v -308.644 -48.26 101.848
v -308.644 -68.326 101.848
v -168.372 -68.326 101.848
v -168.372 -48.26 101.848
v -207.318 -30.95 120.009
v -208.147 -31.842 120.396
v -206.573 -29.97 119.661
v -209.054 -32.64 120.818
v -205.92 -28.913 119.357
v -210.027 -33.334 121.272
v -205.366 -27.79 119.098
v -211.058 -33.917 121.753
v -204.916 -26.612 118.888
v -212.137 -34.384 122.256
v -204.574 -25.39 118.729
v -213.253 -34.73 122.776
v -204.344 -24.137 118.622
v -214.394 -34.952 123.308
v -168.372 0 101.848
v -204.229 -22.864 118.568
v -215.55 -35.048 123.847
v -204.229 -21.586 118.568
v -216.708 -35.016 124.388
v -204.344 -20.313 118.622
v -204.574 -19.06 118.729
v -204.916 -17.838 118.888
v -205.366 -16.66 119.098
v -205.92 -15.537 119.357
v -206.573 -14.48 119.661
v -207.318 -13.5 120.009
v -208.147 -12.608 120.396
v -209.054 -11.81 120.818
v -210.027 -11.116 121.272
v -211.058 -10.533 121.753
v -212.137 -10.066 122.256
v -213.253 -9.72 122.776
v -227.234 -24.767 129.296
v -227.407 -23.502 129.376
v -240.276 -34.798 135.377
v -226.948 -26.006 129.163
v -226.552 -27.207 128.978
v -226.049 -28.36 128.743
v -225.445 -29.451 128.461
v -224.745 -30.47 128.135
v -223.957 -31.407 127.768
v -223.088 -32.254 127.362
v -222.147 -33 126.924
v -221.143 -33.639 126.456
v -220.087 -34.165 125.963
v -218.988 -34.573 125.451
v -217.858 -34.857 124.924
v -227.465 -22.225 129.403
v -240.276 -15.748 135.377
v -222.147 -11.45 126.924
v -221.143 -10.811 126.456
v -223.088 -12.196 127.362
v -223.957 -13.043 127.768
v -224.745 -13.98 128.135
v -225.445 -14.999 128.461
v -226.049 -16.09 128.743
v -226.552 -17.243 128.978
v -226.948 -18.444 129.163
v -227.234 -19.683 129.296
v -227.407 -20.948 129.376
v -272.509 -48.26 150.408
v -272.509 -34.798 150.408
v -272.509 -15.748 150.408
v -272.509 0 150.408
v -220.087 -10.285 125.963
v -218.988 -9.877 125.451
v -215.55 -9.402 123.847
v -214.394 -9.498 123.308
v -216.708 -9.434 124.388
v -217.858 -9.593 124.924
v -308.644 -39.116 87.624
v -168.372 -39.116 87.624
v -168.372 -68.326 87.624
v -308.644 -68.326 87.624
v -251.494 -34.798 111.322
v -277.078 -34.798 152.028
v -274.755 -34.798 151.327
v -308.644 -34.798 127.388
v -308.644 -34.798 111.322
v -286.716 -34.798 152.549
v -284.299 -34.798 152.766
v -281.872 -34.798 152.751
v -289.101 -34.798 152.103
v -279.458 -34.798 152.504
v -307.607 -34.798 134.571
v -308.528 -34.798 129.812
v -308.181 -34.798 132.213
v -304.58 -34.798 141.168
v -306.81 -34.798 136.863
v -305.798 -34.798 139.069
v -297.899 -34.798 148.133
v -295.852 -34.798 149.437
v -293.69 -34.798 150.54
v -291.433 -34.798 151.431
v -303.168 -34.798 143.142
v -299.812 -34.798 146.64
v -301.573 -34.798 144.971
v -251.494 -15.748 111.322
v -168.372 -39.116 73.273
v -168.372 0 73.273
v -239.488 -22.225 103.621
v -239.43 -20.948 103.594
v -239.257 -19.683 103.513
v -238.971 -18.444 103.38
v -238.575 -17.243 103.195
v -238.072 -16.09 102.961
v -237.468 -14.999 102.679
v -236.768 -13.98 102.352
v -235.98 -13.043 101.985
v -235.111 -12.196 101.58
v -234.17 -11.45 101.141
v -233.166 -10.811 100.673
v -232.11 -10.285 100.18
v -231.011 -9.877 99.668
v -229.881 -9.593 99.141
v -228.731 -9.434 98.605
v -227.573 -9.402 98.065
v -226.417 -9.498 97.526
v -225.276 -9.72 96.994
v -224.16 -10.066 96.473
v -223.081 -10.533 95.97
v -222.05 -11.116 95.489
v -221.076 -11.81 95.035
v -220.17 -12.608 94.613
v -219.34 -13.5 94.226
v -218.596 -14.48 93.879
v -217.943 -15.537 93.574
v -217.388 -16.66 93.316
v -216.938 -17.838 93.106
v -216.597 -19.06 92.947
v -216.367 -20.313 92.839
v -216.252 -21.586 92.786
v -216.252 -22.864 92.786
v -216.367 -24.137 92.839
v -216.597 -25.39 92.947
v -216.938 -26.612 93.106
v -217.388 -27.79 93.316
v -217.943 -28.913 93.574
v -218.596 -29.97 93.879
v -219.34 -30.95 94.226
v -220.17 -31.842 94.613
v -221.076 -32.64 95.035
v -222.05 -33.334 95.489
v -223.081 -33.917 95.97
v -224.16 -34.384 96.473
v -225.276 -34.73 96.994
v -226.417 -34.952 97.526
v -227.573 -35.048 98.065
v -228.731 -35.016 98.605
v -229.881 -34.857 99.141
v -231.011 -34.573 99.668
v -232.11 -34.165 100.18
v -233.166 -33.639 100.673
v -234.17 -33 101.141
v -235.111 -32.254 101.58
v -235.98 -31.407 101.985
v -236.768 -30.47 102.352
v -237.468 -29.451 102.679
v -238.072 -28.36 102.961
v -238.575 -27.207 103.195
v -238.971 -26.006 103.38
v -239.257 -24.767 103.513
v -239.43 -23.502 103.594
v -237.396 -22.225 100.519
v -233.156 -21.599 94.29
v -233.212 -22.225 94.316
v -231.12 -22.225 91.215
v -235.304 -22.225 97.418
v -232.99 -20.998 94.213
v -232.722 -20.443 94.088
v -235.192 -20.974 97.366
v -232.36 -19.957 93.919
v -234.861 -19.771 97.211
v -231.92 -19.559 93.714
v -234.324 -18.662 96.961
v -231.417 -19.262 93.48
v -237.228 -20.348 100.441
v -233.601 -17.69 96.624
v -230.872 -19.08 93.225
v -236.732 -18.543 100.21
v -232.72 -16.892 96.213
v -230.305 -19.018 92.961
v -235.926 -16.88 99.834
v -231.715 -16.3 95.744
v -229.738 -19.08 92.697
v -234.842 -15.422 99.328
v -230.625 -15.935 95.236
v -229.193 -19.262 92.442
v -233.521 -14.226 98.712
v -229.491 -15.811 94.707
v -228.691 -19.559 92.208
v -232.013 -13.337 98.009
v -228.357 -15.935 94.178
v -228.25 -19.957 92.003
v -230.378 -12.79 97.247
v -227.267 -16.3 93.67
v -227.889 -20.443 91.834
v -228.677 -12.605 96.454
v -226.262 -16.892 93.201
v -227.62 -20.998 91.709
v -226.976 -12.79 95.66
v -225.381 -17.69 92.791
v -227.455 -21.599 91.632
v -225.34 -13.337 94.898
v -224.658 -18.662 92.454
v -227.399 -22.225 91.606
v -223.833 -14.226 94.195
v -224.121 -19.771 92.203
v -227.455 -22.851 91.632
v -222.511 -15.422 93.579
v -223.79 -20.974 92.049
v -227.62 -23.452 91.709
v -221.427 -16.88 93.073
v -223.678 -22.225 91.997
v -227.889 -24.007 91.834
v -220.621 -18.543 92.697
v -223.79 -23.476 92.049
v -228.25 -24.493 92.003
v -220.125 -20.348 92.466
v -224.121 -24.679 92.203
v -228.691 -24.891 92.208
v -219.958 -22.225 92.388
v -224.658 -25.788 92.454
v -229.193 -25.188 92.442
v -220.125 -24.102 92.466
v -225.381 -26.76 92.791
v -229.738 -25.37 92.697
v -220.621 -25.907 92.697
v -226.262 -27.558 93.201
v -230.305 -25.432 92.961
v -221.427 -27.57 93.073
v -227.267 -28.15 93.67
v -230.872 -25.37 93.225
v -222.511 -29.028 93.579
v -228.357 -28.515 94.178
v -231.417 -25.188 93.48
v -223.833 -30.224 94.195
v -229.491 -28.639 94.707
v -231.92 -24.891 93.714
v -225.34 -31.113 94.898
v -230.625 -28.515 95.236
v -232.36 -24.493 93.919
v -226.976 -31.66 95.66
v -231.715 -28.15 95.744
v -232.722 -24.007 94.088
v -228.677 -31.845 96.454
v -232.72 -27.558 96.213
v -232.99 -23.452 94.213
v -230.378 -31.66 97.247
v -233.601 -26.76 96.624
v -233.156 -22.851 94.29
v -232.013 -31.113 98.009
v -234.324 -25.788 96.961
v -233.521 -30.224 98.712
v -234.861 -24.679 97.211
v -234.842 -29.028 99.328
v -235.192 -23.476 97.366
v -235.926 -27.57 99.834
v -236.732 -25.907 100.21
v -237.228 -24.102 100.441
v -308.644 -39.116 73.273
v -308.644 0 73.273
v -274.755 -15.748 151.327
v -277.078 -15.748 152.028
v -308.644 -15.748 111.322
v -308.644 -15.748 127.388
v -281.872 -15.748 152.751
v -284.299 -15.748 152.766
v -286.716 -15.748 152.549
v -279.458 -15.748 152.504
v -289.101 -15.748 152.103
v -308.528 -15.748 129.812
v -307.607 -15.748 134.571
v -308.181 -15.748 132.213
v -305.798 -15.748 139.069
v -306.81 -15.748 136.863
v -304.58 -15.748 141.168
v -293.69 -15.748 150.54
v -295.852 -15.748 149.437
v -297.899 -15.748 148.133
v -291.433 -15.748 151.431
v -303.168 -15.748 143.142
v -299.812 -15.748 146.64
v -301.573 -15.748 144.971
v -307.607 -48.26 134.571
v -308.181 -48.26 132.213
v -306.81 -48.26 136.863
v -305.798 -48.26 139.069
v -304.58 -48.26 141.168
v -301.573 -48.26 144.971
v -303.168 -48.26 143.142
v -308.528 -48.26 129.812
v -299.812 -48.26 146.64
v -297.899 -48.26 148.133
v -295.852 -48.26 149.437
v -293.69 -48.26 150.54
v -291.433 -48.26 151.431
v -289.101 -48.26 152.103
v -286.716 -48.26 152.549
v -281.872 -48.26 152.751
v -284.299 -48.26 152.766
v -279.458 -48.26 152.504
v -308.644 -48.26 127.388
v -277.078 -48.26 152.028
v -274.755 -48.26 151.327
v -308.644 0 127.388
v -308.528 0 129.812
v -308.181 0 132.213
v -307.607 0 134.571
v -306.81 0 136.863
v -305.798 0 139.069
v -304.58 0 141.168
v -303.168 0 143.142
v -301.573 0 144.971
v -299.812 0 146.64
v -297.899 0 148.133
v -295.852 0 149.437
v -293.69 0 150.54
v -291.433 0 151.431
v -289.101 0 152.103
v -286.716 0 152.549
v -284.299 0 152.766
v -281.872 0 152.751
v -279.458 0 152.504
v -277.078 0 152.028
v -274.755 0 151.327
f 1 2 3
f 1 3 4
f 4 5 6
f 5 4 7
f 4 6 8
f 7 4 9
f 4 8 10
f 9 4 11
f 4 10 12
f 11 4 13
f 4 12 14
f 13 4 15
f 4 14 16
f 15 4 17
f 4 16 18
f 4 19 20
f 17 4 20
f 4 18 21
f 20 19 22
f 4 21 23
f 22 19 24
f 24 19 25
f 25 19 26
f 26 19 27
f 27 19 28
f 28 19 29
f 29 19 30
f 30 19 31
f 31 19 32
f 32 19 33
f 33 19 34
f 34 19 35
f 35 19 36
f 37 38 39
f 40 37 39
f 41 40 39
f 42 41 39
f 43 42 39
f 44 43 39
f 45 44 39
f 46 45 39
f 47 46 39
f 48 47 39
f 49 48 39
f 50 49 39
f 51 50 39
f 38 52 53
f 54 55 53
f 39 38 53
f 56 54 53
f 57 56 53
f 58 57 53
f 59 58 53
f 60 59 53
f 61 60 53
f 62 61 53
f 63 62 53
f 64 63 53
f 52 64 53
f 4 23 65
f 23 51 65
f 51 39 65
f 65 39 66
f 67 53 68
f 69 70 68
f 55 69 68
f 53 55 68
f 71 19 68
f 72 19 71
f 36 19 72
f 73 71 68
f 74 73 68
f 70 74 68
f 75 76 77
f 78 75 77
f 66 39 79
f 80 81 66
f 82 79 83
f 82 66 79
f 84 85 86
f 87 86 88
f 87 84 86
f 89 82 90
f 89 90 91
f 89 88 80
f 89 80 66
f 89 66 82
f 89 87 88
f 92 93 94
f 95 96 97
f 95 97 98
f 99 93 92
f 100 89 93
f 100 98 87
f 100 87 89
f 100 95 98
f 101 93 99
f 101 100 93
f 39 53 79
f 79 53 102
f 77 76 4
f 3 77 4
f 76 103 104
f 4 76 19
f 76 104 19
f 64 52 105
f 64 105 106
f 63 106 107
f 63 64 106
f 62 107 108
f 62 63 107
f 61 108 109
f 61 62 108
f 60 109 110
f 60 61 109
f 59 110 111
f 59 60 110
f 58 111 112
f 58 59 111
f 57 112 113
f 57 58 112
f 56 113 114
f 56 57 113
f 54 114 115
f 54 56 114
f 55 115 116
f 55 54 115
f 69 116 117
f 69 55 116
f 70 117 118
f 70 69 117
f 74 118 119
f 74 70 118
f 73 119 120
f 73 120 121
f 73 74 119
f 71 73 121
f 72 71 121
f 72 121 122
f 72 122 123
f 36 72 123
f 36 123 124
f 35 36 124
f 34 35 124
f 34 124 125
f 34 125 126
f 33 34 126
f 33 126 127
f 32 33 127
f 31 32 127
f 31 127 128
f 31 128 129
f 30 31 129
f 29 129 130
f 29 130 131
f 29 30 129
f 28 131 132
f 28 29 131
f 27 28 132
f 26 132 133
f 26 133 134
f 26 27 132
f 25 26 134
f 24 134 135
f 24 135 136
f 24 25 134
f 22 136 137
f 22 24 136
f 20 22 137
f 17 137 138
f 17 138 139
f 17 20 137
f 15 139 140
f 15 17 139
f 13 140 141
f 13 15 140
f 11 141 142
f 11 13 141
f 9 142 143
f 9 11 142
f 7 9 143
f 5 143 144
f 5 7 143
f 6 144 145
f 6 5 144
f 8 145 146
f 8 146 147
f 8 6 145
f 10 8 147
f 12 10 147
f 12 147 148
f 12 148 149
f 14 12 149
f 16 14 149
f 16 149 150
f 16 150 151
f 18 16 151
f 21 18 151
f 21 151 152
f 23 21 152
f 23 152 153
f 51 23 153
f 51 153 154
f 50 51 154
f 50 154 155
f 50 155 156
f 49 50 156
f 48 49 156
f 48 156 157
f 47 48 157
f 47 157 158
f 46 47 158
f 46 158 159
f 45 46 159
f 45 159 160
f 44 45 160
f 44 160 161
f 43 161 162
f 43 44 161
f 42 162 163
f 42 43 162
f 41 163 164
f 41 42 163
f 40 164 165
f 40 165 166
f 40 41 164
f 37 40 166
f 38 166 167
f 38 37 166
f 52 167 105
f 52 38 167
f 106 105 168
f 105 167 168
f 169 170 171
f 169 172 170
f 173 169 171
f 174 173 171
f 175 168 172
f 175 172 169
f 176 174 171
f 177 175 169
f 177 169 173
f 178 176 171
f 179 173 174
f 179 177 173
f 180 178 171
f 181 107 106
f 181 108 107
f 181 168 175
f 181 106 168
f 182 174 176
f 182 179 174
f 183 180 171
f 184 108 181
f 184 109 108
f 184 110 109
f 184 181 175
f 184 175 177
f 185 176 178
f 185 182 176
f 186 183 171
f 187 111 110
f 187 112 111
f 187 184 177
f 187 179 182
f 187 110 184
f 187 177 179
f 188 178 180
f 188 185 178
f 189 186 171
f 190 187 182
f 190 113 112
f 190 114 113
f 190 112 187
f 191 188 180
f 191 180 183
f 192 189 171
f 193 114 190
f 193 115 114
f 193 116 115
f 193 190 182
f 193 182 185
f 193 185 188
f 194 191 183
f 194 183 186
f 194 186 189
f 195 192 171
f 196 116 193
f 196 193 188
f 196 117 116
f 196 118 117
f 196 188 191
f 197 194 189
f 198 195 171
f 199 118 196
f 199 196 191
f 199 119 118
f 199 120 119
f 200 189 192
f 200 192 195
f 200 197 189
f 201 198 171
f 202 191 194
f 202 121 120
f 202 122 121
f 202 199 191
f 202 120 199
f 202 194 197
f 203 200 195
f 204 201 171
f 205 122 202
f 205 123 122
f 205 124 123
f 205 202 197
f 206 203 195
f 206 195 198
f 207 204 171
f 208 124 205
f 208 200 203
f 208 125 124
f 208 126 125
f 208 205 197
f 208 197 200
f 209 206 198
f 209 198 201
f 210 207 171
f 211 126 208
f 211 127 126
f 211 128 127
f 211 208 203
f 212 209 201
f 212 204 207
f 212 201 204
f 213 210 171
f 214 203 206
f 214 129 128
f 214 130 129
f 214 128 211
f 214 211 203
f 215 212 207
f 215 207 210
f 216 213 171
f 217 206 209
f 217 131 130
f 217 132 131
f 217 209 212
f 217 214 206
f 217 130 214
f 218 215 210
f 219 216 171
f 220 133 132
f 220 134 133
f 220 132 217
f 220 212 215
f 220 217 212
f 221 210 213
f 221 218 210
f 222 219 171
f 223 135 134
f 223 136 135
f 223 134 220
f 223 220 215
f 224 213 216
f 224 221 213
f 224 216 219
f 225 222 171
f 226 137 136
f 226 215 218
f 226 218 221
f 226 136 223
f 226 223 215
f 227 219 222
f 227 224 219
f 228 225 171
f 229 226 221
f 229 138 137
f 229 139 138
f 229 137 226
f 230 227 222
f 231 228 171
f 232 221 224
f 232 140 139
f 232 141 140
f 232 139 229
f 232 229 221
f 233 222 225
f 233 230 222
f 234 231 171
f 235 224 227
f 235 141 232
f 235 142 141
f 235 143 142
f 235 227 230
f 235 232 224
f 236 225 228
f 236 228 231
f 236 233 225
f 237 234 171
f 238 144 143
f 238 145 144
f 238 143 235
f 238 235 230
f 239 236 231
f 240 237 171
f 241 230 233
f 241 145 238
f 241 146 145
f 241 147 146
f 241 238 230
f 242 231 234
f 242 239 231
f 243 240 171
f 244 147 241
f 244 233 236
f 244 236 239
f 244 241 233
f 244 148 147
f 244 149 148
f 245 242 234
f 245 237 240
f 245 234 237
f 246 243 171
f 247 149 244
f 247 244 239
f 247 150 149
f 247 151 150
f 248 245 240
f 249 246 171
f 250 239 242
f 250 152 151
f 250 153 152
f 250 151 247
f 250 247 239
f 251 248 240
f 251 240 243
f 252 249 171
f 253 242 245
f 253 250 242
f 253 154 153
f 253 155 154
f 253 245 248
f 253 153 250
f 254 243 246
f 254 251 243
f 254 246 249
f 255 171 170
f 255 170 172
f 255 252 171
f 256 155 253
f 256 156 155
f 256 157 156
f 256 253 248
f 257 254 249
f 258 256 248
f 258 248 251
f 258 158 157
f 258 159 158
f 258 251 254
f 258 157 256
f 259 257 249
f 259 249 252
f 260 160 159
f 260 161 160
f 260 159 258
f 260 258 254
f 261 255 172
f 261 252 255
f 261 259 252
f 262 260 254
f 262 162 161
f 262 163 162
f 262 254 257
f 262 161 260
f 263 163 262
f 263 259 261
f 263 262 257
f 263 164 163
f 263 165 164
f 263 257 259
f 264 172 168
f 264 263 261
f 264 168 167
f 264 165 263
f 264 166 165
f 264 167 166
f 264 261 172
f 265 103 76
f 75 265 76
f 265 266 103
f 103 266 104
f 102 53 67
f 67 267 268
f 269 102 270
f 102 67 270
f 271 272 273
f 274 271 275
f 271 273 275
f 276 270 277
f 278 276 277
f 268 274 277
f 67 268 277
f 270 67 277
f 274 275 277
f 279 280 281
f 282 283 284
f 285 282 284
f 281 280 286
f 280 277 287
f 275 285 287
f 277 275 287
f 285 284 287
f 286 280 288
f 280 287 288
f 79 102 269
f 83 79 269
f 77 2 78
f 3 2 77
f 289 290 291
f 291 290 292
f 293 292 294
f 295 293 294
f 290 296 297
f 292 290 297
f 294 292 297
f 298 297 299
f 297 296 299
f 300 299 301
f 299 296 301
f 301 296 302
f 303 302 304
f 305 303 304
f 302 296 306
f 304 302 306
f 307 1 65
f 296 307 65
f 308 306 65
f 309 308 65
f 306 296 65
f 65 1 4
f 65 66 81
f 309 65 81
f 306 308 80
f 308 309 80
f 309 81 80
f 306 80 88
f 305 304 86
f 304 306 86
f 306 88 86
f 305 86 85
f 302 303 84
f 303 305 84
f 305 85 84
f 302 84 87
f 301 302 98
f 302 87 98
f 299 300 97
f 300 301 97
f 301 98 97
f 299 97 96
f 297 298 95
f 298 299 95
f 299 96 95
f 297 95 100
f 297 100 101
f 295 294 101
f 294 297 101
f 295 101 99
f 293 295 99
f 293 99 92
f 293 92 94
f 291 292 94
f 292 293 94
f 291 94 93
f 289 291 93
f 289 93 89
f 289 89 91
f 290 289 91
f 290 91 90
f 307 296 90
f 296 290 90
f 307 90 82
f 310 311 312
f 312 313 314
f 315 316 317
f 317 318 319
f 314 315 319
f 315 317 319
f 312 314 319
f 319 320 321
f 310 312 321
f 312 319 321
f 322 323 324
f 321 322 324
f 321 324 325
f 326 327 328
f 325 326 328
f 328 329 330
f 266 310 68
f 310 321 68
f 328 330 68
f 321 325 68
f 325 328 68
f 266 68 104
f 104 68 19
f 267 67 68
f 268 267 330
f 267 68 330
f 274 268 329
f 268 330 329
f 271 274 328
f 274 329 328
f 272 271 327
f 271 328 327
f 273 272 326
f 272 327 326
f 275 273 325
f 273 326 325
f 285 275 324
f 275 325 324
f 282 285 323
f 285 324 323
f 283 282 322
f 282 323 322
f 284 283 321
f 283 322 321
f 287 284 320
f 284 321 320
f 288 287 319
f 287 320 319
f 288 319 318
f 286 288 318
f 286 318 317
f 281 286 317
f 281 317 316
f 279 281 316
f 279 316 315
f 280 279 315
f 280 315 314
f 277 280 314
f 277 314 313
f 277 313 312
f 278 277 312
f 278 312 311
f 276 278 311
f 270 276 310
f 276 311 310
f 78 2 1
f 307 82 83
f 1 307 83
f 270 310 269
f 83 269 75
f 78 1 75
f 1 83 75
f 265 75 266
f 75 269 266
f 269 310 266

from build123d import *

# Parameters (mm, degrees)
F1_DEPTH = 68.326
F3_DEPTH = 140.2725
F9_DEPTH = 19.05


with BuildPart() as f1:
    # F0 (on Front) → F1 (new body)
    with BuildSketch(Plane.XZ):
        with BuildLine():
            Line((-308.6435369492, 127.387571028), (-308.6435369492, 73.2729100159))
            Line((-308.6435369492, 73.2729100159), (-168.3720369492, 73.2729100159))
            Line((-168.3720369492, 73.2729100159), (-168.3720369492, 101.8479100159))
            Line((-168.3720369492, 101.8479100159), (-272.5090331009, 150.4077888187))
            ThreePointArc((-272.5090331009, 150.4077888187), (-296.8909470012, 148.8097137516), (-308.6435369492, 127.387571028))
        make_face()
    extrude(amount=F1_DEPTH)

    # F2 (on face) → F3 (cut, through all)
    with BuildSketch(Plane.YZ.offset(-168.3720369492)):
        Polygon((-39.116, 87.6239100159), (-76.0061219335, 87.6239100159), (-76.0061219335, 101.8479100159), (-48.26, 101.8479100159), (-48.26, 161.3023877144), (-91.7473509908, 161.3023877144), (-91.7473509908, 73.2729100159), (-39.116, 73.2729100159), align=None)
    extrude(amount=-F3_DEPTH, mode=Mode.SUBTRACT)

    # F5 (on offset) → F6 (revolve, cut)
    with BuildSketch(Plane(origin=(0, -22.225, 0), x_dir=(-1, 0, 0), z_dir=(0, 1, 0))):
        Polygon((226.816497322, 130.7939626652), (214.7088005788, 126.4077344154), (231.1195903604, 91.2146821577), (239.487580328, 103.6207374686), align=None)
    revolve(axis=Axis((-222.9141954696, -22.225, 108.8112082866), (-0.4226182617, 0, -0.906307787)), mode=Mode.SUBTRACT)

    # F8 (on offset) → F9 (cut)
    with BuildSketch(Plane(origin=(0, -15.748, 0), x_dir=(-1, 0, 0), z_dir=(0, 1, 0))):
        Polygon((320.8571528949, 158.3946817508), (229.5432362601, 158.3946817508), (251.4935369492, 111.3221100159), (320.8571528949, 111.3221100159), align=None)
    extrude(amount=-F9_DEPTH, mode=Mode.SUBTRACT)


solid = f1.part
